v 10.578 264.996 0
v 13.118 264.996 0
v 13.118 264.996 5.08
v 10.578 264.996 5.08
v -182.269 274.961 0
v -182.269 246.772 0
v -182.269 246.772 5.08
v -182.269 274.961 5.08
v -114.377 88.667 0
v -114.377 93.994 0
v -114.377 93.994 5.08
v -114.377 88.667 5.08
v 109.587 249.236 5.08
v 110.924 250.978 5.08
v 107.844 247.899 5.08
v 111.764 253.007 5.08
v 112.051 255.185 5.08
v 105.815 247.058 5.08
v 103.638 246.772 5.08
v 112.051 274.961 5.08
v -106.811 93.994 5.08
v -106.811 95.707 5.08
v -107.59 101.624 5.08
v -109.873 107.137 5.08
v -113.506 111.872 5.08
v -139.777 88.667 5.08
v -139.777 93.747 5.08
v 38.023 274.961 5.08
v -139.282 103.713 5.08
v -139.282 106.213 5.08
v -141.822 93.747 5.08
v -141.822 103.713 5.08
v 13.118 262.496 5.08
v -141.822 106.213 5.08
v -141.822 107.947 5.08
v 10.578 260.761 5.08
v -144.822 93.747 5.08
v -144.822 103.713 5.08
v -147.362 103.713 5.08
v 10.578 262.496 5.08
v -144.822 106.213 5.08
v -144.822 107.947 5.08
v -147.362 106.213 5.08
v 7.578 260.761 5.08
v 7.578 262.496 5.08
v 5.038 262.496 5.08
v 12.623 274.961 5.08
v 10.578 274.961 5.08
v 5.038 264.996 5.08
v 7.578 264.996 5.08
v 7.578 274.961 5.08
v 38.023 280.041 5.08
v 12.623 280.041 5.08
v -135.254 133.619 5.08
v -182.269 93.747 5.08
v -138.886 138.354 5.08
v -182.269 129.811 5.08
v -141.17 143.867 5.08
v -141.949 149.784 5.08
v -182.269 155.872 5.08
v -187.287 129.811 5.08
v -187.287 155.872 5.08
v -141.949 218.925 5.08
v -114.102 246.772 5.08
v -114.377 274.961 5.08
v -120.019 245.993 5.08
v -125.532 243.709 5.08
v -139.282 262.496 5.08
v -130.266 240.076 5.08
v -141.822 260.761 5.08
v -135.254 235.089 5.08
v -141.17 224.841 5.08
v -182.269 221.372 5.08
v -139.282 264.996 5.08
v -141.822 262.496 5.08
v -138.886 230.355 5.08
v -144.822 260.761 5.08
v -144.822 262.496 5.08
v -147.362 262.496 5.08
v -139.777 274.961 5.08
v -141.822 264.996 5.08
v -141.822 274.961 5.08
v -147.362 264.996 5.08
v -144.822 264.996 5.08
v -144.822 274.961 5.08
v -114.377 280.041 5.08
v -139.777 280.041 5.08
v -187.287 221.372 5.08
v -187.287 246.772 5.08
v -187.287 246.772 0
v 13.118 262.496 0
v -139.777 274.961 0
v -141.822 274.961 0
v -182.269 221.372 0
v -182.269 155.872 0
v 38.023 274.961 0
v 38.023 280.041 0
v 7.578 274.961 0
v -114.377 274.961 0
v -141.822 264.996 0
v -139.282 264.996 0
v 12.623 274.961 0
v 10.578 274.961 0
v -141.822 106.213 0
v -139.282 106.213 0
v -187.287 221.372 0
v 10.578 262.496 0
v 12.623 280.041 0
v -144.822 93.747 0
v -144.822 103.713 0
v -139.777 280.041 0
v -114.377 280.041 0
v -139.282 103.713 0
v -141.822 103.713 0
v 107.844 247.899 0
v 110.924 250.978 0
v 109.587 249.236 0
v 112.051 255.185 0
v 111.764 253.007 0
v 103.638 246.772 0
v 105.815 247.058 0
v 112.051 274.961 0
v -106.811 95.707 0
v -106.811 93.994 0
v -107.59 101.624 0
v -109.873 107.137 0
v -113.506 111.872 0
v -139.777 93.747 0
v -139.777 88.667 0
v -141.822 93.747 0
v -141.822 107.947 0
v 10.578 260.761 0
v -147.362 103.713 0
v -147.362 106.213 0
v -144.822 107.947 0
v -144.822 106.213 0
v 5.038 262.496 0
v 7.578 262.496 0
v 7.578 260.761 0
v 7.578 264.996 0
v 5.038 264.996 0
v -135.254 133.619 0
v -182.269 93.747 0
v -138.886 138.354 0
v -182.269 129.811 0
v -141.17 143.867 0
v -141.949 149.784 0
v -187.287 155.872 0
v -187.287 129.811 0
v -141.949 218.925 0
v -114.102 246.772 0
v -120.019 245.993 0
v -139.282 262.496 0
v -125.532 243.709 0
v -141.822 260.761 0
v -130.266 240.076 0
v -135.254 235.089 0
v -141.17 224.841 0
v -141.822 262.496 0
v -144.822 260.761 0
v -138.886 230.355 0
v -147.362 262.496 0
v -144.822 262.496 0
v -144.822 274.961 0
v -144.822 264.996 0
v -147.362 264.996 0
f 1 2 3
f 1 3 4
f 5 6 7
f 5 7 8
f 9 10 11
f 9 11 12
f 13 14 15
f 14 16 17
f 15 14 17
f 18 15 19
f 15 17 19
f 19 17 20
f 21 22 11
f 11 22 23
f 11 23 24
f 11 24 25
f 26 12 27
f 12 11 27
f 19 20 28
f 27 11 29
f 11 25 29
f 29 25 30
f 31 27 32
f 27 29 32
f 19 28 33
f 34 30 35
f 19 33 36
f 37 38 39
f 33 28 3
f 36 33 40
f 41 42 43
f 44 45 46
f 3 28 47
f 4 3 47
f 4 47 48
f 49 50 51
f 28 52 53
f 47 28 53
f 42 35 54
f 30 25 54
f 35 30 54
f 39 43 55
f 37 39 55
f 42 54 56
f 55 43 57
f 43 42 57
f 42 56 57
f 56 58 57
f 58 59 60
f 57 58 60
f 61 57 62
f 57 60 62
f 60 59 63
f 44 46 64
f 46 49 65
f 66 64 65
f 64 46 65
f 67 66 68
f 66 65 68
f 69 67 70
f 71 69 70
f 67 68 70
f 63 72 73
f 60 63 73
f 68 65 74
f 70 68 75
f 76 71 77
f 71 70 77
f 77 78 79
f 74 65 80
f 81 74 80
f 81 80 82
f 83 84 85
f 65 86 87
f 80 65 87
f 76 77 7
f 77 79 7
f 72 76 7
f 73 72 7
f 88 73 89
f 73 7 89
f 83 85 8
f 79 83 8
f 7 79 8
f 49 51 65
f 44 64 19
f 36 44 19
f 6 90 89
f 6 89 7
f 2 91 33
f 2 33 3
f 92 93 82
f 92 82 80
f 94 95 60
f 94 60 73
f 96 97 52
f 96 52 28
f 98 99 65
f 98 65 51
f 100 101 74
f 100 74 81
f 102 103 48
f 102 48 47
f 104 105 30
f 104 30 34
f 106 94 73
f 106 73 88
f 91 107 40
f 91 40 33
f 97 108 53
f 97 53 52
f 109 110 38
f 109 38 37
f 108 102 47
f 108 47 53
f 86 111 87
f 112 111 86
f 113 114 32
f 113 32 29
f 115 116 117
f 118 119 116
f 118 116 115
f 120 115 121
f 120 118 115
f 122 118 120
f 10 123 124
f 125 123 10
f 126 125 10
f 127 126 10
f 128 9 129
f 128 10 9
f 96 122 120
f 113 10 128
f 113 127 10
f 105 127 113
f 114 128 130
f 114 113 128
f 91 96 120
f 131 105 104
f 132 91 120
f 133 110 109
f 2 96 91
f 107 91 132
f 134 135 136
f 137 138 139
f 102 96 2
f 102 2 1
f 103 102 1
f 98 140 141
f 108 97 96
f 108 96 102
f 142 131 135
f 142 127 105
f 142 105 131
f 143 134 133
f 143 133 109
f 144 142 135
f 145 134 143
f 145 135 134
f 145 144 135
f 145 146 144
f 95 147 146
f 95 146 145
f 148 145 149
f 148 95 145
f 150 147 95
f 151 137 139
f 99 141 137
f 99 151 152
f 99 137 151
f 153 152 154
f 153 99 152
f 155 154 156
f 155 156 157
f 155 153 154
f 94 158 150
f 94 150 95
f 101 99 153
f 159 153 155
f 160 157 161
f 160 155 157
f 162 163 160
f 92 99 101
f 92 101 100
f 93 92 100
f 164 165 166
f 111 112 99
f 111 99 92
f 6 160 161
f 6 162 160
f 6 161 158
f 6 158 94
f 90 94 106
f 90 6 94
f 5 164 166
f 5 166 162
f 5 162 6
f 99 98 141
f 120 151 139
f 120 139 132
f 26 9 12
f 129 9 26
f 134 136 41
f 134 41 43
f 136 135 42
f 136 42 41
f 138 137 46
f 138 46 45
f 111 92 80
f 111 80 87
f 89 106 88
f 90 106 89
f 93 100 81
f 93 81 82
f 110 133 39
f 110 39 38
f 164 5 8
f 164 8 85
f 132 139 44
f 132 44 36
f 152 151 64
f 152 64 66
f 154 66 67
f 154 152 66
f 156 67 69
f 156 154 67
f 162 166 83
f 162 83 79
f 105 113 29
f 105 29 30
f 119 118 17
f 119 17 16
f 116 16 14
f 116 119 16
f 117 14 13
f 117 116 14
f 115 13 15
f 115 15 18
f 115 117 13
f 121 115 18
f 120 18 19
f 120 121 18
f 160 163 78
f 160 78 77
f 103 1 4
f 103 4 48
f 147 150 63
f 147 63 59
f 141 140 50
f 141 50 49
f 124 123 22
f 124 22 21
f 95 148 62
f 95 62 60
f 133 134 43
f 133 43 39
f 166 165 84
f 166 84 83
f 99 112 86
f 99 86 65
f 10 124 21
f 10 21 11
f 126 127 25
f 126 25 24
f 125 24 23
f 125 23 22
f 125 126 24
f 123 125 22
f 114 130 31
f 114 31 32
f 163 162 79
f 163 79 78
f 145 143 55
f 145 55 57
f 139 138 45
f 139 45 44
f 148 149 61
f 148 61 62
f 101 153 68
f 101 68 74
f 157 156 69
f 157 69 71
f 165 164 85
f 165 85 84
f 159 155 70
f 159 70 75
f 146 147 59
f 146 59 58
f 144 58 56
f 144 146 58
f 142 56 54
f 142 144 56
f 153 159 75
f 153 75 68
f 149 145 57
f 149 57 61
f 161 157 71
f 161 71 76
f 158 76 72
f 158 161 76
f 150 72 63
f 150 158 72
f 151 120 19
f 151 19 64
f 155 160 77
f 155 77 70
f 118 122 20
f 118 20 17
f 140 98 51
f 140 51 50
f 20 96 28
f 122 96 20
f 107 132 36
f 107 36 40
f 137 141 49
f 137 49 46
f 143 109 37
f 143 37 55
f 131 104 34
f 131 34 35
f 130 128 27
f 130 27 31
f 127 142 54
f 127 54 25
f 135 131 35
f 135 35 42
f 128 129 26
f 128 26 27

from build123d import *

# Parameters (mm, degrees)
BOSS_EXTRUDE1_DEPTH = 5.08


with BuildPart() as part:
    # Sketch1 → Boss-Extrude1 (new body)
    with BuildSketch(Plane.XY):
        with BuildLine():
            Line((-114.376804032, 88.667051475), (-139.776804032, 88.667051475))
            Line((-139.776804032, 88.667051475), (-139.776804032, 93.747051475))
            Line((-139.776804032, 93.747051475), (-141.822276948, 93.747051475))
            Line((-141.822276948, 93.747051475), (-141.822276948, 103.713000769))
            Line((-141.822276948, 103.713000769), (-139.282276948, 103.713000769))
            Line((-139.282276948, 103.713000769), (-139.282276948, 106.213000769))
            Line((-139.282276948, 106.213000769), (-141.822276948, 106.213000769))
            Line((-141.822276948, 106.213000769), (-141.822276948, 107.947051475))
            Line((-141.822276948, 107.947051475), (-144.822276948, 107.947051475))
            Line((-144.822276948, 107.947051475), (-144.822276948, 106.213000769))
            Line((-144.822276948, 106.213000769), (-147.362276948, 106.213000769))
            Line((-147.362276948, 106.213000769), (-147.362276948, 103.713000769))
            Line((-147.362276948, 103.713000769), (-144.822276948, 103.713000769))
            Line((-144.822276948, 103.713000769), (-144.822276948, 93.747051475))
            Line((-144.822276948, 93.747051475), (-182.269486813, 93.747051475))
            Line((-182.269486813, 93.747051475), (-182.269486813, 129.81075177))
            Line((-182.269486813, 129.81075177), (-187.286518352, 129.81075177))
            Line((-187.286518352, 129.81075177), (-187.286518352, 155.871504364))
            Line((-187.286518352, 155.871504364), (-182.269486813, 155.871504364))
            Line((-182.269486813, 155.871504364), (-182.269486813, 212.837023738))
            Line((-182.269486813, 212.837023738), (-182.269486813, 221.371776332))
            Line((-182.269486813, 221.371776332), (-187.286518352, 221.371776332))
            Line((-187.286518352, 221.371776332), (-187.286518352, 246.771776332))
            Line((-187.286518352, 246.771776332), (-182.269486813, 246.771776332))
            Line((-182.269486813, 246.771776332), (-182.269486813, 274.961476627))
            Line((-182.269486813, 274.961476627), (-144.822276948, 274.961476627))
            Line((-144.822276948, 274.961476627), (-144.822276948, 264.995527332))
            Line((-144.822276948, 264.995527332), (-147.362276948, 264.995527332))
            Line((-147.362276948, 264.995527332), (-147.362276948, 262.495527332))
            Line((-147.362276948, 262.495527332), (-144.822276948, 262.495527332))
            Line((-144.822276948, 262.495527332), (-144.822276948, 260.761476627))
            Line((-144.822276948, 260.761476627), (-141.822276948, 260.761476627))
            Line((-141.822276948, 260.761476627), (-141.822276948, 262.495527332))
            Line((-141.822276948, 262.495527332), (-139.282276948, 262.495527332))
            Line((-139.282276948, 262.495527332), (-139.282276948, 264.995527332))
            Line((-139.282276948, 264.995527332), (-141.822276948, 264.995527332))
            Line((-141.822276948, 264.995527332), (-141.822276948, 274.961476627))
            Line((-141.822276948, 274.961476627), (-139.776804032, 274.961476627))
            Line((-139.776804032, 274.961476627), (-139.776804032, 280.041476627))
            Line((-139.776804032, 280.041476627), (-114.376804032, 280.041476627))
            Line((-114.376804032, 280.041476627), (-114.376804032, 274.961476627))
            Line((-114.376804032, 274.961476627), (-106.810604162, 274.961476627))
            Line((-106.810604162, 274.961476627), (7.577723052, 274.961476627))
            Line((7.577723052, 274.961476627), (7.577723052, 264.995527332))
            Line((7.577723052, 264.995527332), (5.037723052, 264.995527332))
            Line((5.037723052, 264.995527332), (5.037723052, 262.495527332))
            Line((5.037723052, 262.495527332), (7.577723052, 262.495527332))
            Line((7.577723052, 262.495527332), (7.577723052, 260.761476627))
            Line((7.577723052, 260.761476627), (10.577723052, 260.761476627))
            Line((10.577723052, 260.761476627), (10.577723052, 262.495527332))
            Line((10.577723052, 262.495527332), (13.117723052, 262.495527332))
            Line((13.117723052, 262.495527332), (13.117723052, 264.995527332))
            Line((13.117723052, 264.995527332), (10.577723052, 264.995527332))
            Line((10.577723052, 264.995527332), (10.577723052, 274.961476627))
            Line((10.577723052, 274.961476627), (12.623195968, 274.961476627))
            Line((12.623195968, 274.961476627), (12.623195968, 280.041476627))
            Line((12.623195968, 280.041476627), (38.023195968, 280.041476627))
            Line((38.023195968, 280.041476627), (38.023195968, 274.961476627))
            Line((38.023195968, 274.961476627), (112.050844633, 274.961476627))
            Line((112.050844633, 274.961476627), (112.050844633, 255.184968454))
            ThreePointArc((112.050844633, 255.184968454), (109.586677712, 249.235943253), (103.63765251, 246.771776332))
            Line((103.63765251, 246.771776332), (-114.102022694, 246.771776332))
            ThreePointArc((-114.102022694, 246.771776332), (-122.850165958, 245.031662445), (-130.266483712, 240.076237349))
            Line((-130.266483712, 240.076237349), (-135.253616385, 235.089104676))
            ThreePointArc((-135.253616385, 235.089104676), (-140.20904148, 227.672786922), (-141.949155367, 218.924643658))
            Line((-141.949155367, 218.924643658), (-141.949155367, 149.783884443))
            ThreePointArc((-141.949155367, 149.783884443), (-140.20904148, 141.035741179), (-135.253616385, 133.619423425))
            Line((-135.253616385, 133.619423425), (-113.506143144, 111.871950184))
            ThreePointArc((-113.506143144, 111.871950184), (-108.550718048, 104.45563243), (-106.810604162, 95.707489166))
            Line((-106.810604162, 95.707489166), (-106.810604162, 93.993771805))
            Line((-106.810604162, 93.993771805), (-114.376804032, 93.993771805))
            Line((-114.376804032, 93.993771805), (-114.376804032, 88.93863086))
            Line((-114.376804032, 88.93863086), (-114.376804032, 88.667051475))
        make_face()
    extrude(amount=BOSS_EXTRUDE1_DEPTH)


solid = part.part
